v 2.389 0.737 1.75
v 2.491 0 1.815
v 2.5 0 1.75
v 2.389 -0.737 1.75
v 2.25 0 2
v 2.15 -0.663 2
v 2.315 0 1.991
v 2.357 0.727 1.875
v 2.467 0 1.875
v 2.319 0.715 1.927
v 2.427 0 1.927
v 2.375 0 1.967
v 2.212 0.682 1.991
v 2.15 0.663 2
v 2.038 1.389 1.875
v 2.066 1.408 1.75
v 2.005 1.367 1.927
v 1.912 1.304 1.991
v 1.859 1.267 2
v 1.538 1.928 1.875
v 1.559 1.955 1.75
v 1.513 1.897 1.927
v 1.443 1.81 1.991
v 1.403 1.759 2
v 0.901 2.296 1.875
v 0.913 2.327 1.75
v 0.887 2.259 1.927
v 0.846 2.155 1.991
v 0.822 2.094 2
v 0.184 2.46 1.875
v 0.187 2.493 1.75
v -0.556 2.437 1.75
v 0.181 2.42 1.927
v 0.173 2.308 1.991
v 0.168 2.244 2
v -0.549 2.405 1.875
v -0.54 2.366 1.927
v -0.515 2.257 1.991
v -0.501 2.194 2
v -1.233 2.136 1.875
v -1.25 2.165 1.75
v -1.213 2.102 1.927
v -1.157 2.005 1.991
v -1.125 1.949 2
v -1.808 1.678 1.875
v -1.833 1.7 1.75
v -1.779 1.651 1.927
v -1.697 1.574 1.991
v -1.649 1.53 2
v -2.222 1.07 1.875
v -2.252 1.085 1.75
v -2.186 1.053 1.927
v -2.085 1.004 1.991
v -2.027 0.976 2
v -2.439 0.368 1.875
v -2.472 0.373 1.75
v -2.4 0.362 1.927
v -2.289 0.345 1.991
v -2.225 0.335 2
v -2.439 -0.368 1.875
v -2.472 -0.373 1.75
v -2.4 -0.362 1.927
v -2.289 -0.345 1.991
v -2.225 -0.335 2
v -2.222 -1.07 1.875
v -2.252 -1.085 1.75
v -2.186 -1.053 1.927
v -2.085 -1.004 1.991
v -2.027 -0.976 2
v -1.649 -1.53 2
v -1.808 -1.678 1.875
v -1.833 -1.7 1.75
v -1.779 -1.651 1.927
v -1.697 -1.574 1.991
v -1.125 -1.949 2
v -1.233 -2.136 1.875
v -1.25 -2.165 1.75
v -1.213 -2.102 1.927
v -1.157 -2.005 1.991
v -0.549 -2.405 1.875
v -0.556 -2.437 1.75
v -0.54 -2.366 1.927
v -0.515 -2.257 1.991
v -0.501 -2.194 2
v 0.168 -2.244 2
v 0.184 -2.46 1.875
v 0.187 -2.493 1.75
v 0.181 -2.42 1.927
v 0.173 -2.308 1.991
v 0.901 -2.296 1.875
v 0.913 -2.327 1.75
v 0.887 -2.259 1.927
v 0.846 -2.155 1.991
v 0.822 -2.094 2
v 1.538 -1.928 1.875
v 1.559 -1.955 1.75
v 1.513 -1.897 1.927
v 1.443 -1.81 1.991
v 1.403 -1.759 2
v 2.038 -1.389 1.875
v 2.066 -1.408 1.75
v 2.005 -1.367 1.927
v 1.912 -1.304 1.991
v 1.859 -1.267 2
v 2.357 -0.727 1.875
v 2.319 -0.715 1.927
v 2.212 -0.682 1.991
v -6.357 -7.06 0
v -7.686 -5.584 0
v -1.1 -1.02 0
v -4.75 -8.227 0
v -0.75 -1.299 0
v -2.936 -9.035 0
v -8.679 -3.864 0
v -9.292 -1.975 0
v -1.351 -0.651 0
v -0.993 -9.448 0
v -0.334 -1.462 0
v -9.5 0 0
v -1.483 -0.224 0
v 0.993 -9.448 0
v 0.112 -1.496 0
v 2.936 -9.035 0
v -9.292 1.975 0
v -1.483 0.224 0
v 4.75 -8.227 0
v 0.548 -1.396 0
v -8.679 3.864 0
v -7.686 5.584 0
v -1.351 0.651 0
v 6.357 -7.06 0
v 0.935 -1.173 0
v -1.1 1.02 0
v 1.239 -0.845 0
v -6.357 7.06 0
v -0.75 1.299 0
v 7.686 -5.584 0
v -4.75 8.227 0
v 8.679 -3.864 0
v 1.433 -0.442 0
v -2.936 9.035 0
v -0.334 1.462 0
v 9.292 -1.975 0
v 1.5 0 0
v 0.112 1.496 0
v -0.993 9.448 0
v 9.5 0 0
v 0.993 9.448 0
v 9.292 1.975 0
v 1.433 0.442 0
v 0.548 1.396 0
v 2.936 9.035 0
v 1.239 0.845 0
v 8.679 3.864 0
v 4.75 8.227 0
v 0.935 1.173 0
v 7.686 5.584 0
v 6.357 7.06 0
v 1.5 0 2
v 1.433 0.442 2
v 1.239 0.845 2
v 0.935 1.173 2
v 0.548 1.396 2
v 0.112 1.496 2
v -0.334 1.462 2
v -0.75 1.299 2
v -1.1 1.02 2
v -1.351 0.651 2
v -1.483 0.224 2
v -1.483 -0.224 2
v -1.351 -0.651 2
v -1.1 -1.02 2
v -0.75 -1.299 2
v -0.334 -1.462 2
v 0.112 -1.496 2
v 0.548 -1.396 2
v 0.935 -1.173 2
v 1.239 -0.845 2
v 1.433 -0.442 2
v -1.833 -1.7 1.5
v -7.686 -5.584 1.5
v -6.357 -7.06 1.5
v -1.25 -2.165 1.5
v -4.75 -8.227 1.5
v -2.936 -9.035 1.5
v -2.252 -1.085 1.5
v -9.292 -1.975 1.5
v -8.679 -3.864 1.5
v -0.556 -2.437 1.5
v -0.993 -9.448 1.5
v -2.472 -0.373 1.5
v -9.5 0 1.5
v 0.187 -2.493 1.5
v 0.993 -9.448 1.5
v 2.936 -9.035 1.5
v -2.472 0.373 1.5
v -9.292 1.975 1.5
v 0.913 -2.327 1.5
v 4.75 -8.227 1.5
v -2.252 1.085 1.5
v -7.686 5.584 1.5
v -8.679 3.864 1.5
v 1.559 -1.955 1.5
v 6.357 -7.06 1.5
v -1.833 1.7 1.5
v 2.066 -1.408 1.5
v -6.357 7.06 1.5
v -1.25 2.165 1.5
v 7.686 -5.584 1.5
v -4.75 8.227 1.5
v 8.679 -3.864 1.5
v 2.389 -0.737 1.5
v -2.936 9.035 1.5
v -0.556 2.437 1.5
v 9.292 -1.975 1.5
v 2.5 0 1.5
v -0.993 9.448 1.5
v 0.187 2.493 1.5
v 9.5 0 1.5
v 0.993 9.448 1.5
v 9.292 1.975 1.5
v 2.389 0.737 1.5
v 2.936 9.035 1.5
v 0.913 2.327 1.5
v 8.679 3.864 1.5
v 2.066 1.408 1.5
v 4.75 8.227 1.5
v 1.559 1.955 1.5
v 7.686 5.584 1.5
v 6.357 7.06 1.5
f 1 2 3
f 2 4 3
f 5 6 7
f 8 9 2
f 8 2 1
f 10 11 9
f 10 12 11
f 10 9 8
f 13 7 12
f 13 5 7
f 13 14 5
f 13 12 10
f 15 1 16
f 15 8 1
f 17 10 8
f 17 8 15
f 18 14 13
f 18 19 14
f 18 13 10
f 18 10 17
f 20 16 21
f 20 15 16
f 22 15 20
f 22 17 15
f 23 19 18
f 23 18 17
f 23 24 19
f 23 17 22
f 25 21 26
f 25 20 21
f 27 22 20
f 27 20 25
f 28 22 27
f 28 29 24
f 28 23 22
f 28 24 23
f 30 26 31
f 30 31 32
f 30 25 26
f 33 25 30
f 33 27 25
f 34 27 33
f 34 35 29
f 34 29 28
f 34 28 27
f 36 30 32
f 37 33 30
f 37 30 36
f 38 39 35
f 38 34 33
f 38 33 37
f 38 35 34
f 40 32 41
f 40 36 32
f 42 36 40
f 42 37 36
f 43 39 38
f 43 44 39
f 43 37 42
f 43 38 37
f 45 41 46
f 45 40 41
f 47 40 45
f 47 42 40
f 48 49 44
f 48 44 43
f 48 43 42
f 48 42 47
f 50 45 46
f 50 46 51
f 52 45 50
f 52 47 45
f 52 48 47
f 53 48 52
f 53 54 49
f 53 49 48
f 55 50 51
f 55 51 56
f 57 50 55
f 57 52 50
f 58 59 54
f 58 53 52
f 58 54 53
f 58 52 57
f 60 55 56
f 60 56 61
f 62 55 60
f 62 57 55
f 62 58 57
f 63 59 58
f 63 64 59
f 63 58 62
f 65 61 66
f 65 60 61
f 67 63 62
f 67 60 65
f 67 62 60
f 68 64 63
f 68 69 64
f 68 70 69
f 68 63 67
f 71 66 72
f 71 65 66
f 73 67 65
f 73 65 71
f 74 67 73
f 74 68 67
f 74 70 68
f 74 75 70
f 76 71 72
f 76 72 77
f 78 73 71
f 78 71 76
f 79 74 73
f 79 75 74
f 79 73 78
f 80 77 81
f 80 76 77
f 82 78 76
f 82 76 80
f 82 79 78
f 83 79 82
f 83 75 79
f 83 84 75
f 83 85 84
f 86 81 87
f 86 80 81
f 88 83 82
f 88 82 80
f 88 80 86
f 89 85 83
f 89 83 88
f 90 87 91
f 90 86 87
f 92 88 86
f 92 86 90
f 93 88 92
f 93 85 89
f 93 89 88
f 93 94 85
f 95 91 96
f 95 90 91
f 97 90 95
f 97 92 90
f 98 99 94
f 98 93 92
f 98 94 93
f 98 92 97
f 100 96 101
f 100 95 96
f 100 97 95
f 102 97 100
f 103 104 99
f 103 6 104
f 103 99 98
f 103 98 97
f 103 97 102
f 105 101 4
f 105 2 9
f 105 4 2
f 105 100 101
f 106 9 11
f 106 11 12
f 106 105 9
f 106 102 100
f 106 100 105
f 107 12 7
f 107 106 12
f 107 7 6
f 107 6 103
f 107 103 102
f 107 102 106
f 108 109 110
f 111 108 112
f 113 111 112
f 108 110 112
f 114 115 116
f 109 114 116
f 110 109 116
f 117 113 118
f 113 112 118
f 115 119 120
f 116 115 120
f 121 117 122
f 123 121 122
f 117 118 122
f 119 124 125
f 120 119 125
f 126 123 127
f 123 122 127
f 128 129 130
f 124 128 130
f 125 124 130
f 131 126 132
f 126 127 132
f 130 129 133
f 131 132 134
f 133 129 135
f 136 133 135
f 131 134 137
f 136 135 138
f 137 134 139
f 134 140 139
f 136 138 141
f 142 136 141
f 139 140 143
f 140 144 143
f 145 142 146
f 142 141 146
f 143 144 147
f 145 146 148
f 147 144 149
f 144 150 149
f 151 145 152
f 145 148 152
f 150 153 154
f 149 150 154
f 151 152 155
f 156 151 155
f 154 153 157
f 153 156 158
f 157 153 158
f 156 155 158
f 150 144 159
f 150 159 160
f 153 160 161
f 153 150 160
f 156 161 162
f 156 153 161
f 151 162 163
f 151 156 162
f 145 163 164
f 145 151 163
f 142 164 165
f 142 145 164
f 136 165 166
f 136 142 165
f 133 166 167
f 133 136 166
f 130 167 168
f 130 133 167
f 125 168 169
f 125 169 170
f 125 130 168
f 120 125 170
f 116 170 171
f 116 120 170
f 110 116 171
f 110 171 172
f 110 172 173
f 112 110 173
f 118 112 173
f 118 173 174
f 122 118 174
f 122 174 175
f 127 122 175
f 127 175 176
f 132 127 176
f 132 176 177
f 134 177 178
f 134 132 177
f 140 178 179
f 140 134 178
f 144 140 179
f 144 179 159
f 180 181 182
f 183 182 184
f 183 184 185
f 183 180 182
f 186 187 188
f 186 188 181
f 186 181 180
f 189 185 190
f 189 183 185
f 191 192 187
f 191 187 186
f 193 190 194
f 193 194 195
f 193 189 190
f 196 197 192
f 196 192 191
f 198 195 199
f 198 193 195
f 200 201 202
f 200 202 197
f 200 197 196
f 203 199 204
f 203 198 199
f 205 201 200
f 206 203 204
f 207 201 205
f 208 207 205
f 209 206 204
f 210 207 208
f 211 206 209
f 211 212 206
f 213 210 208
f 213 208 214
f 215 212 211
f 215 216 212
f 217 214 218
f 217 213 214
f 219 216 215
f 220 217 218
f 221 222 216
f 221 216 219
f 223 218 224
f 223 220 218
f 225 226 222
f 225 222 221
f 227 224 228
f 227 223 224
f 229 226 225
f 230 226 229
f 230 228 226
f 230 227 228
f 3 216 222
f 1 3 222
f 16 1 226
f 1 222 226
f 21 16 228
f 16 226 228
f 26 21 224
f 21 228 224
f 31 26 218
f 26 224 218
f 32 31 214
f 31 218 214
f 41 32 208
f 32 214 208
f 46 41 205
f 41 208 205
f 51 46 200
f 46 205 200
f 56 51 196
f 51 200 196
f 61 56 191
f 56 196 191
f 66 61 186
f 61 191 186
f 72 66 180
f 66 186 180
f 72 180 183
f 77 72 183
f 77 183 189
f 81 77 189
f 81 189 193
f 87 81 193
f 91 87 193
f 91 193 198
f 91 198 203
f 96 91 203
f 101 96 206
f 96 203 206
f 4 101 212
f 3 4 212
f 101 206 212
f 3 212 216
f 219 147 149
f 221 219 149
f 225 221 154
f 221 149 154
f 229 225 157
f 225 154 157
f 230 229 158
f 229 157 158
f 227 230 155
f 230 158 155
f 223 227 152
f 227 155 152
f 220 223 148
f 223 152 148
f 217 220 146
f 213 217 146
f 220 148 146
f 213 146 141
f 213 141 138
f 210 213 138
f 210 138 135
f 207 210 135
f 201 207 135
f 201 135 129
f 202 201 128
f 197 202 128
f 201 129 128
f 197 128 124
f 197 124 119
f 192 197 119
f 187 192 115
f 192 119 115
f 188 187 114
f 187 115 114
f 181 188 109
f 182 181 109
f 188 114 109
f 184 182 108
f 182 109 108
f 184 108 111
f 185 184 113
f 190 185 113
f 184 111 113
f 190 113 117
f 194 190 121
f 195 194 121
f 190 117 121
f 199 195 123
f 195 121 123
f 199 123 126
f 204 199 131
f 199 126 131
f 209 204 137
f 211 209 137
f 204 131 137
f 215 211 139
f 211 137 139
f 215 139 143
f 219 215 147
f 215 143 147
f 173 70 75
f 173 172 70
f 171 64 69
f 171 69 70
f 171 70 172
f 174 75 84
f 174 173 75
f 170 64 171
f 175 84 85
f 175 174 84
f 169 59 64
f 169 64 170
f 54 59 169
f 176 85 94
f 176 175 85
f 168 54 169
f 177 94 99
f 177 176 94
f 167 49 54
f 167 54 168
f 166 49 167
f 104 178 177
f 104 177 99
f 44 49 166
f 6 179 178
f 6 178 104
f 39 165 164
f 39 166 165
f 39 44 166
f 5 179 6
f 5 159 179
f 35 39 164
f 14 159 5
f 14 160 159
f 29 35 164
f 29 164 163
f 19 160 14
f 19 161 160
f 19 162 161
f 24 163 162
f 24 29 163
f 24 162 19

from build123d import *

# Parameters (mm, degrees)
SKETCH2_R          = 19
EXTRUDE1_DEPTH     = 3
SKETCH3_R          = 5
EXTRUDE3_DEPTH     = 1
EXTRUDE4_START     = -4
EXTRUDE4_OUTLINE_R = 3
EXTRUDE4_DEPTH     = 4
FILLET1_R          = 0.5
SCALE1_SCALE       = 0.5


# Read off the part's stored shape, not the designer's step: Extrude4
with BuildPart() as part:
    # Sketch2 → Extrude1 (new body)
    with BuildSketch(Plane.XY):
        Circle(SKETCH2_R)
    extrude(amount=EXTRUDE1_DEPTH)

    # Sketch3 → Extrude3 (add)
    with BuildSketch(Plane.XY.offset(3)):
        Circle(SKETCH3_R)
    extrude(amount=EXTRUDE3_DEPTH)

    # Extrude4 outline → Extrude4 (cut)
    with BuildSketch(Plane.XY.offset(4).offset(EXTRUDE4_START)):
        Circle(EXTRUDE4_OUTLINE_R)
    extrude(amount=EXTRUDE4_DEPTH, mode=Mode.SUBTRACT)

    # Fillet1
    fillet1_edges = [part.edges().sort_by_distance(p)[0] for p in [
        (-5, 0, 4),
    ]]
    fillet(fillet1_edges, radius=FILLET1_R)


with BuildPart() as part_1:
    # Scale1: scaled about (0, 0, 0)
    add(part.part.scale(SCALE1_SCALE))


solid = part_1.part
